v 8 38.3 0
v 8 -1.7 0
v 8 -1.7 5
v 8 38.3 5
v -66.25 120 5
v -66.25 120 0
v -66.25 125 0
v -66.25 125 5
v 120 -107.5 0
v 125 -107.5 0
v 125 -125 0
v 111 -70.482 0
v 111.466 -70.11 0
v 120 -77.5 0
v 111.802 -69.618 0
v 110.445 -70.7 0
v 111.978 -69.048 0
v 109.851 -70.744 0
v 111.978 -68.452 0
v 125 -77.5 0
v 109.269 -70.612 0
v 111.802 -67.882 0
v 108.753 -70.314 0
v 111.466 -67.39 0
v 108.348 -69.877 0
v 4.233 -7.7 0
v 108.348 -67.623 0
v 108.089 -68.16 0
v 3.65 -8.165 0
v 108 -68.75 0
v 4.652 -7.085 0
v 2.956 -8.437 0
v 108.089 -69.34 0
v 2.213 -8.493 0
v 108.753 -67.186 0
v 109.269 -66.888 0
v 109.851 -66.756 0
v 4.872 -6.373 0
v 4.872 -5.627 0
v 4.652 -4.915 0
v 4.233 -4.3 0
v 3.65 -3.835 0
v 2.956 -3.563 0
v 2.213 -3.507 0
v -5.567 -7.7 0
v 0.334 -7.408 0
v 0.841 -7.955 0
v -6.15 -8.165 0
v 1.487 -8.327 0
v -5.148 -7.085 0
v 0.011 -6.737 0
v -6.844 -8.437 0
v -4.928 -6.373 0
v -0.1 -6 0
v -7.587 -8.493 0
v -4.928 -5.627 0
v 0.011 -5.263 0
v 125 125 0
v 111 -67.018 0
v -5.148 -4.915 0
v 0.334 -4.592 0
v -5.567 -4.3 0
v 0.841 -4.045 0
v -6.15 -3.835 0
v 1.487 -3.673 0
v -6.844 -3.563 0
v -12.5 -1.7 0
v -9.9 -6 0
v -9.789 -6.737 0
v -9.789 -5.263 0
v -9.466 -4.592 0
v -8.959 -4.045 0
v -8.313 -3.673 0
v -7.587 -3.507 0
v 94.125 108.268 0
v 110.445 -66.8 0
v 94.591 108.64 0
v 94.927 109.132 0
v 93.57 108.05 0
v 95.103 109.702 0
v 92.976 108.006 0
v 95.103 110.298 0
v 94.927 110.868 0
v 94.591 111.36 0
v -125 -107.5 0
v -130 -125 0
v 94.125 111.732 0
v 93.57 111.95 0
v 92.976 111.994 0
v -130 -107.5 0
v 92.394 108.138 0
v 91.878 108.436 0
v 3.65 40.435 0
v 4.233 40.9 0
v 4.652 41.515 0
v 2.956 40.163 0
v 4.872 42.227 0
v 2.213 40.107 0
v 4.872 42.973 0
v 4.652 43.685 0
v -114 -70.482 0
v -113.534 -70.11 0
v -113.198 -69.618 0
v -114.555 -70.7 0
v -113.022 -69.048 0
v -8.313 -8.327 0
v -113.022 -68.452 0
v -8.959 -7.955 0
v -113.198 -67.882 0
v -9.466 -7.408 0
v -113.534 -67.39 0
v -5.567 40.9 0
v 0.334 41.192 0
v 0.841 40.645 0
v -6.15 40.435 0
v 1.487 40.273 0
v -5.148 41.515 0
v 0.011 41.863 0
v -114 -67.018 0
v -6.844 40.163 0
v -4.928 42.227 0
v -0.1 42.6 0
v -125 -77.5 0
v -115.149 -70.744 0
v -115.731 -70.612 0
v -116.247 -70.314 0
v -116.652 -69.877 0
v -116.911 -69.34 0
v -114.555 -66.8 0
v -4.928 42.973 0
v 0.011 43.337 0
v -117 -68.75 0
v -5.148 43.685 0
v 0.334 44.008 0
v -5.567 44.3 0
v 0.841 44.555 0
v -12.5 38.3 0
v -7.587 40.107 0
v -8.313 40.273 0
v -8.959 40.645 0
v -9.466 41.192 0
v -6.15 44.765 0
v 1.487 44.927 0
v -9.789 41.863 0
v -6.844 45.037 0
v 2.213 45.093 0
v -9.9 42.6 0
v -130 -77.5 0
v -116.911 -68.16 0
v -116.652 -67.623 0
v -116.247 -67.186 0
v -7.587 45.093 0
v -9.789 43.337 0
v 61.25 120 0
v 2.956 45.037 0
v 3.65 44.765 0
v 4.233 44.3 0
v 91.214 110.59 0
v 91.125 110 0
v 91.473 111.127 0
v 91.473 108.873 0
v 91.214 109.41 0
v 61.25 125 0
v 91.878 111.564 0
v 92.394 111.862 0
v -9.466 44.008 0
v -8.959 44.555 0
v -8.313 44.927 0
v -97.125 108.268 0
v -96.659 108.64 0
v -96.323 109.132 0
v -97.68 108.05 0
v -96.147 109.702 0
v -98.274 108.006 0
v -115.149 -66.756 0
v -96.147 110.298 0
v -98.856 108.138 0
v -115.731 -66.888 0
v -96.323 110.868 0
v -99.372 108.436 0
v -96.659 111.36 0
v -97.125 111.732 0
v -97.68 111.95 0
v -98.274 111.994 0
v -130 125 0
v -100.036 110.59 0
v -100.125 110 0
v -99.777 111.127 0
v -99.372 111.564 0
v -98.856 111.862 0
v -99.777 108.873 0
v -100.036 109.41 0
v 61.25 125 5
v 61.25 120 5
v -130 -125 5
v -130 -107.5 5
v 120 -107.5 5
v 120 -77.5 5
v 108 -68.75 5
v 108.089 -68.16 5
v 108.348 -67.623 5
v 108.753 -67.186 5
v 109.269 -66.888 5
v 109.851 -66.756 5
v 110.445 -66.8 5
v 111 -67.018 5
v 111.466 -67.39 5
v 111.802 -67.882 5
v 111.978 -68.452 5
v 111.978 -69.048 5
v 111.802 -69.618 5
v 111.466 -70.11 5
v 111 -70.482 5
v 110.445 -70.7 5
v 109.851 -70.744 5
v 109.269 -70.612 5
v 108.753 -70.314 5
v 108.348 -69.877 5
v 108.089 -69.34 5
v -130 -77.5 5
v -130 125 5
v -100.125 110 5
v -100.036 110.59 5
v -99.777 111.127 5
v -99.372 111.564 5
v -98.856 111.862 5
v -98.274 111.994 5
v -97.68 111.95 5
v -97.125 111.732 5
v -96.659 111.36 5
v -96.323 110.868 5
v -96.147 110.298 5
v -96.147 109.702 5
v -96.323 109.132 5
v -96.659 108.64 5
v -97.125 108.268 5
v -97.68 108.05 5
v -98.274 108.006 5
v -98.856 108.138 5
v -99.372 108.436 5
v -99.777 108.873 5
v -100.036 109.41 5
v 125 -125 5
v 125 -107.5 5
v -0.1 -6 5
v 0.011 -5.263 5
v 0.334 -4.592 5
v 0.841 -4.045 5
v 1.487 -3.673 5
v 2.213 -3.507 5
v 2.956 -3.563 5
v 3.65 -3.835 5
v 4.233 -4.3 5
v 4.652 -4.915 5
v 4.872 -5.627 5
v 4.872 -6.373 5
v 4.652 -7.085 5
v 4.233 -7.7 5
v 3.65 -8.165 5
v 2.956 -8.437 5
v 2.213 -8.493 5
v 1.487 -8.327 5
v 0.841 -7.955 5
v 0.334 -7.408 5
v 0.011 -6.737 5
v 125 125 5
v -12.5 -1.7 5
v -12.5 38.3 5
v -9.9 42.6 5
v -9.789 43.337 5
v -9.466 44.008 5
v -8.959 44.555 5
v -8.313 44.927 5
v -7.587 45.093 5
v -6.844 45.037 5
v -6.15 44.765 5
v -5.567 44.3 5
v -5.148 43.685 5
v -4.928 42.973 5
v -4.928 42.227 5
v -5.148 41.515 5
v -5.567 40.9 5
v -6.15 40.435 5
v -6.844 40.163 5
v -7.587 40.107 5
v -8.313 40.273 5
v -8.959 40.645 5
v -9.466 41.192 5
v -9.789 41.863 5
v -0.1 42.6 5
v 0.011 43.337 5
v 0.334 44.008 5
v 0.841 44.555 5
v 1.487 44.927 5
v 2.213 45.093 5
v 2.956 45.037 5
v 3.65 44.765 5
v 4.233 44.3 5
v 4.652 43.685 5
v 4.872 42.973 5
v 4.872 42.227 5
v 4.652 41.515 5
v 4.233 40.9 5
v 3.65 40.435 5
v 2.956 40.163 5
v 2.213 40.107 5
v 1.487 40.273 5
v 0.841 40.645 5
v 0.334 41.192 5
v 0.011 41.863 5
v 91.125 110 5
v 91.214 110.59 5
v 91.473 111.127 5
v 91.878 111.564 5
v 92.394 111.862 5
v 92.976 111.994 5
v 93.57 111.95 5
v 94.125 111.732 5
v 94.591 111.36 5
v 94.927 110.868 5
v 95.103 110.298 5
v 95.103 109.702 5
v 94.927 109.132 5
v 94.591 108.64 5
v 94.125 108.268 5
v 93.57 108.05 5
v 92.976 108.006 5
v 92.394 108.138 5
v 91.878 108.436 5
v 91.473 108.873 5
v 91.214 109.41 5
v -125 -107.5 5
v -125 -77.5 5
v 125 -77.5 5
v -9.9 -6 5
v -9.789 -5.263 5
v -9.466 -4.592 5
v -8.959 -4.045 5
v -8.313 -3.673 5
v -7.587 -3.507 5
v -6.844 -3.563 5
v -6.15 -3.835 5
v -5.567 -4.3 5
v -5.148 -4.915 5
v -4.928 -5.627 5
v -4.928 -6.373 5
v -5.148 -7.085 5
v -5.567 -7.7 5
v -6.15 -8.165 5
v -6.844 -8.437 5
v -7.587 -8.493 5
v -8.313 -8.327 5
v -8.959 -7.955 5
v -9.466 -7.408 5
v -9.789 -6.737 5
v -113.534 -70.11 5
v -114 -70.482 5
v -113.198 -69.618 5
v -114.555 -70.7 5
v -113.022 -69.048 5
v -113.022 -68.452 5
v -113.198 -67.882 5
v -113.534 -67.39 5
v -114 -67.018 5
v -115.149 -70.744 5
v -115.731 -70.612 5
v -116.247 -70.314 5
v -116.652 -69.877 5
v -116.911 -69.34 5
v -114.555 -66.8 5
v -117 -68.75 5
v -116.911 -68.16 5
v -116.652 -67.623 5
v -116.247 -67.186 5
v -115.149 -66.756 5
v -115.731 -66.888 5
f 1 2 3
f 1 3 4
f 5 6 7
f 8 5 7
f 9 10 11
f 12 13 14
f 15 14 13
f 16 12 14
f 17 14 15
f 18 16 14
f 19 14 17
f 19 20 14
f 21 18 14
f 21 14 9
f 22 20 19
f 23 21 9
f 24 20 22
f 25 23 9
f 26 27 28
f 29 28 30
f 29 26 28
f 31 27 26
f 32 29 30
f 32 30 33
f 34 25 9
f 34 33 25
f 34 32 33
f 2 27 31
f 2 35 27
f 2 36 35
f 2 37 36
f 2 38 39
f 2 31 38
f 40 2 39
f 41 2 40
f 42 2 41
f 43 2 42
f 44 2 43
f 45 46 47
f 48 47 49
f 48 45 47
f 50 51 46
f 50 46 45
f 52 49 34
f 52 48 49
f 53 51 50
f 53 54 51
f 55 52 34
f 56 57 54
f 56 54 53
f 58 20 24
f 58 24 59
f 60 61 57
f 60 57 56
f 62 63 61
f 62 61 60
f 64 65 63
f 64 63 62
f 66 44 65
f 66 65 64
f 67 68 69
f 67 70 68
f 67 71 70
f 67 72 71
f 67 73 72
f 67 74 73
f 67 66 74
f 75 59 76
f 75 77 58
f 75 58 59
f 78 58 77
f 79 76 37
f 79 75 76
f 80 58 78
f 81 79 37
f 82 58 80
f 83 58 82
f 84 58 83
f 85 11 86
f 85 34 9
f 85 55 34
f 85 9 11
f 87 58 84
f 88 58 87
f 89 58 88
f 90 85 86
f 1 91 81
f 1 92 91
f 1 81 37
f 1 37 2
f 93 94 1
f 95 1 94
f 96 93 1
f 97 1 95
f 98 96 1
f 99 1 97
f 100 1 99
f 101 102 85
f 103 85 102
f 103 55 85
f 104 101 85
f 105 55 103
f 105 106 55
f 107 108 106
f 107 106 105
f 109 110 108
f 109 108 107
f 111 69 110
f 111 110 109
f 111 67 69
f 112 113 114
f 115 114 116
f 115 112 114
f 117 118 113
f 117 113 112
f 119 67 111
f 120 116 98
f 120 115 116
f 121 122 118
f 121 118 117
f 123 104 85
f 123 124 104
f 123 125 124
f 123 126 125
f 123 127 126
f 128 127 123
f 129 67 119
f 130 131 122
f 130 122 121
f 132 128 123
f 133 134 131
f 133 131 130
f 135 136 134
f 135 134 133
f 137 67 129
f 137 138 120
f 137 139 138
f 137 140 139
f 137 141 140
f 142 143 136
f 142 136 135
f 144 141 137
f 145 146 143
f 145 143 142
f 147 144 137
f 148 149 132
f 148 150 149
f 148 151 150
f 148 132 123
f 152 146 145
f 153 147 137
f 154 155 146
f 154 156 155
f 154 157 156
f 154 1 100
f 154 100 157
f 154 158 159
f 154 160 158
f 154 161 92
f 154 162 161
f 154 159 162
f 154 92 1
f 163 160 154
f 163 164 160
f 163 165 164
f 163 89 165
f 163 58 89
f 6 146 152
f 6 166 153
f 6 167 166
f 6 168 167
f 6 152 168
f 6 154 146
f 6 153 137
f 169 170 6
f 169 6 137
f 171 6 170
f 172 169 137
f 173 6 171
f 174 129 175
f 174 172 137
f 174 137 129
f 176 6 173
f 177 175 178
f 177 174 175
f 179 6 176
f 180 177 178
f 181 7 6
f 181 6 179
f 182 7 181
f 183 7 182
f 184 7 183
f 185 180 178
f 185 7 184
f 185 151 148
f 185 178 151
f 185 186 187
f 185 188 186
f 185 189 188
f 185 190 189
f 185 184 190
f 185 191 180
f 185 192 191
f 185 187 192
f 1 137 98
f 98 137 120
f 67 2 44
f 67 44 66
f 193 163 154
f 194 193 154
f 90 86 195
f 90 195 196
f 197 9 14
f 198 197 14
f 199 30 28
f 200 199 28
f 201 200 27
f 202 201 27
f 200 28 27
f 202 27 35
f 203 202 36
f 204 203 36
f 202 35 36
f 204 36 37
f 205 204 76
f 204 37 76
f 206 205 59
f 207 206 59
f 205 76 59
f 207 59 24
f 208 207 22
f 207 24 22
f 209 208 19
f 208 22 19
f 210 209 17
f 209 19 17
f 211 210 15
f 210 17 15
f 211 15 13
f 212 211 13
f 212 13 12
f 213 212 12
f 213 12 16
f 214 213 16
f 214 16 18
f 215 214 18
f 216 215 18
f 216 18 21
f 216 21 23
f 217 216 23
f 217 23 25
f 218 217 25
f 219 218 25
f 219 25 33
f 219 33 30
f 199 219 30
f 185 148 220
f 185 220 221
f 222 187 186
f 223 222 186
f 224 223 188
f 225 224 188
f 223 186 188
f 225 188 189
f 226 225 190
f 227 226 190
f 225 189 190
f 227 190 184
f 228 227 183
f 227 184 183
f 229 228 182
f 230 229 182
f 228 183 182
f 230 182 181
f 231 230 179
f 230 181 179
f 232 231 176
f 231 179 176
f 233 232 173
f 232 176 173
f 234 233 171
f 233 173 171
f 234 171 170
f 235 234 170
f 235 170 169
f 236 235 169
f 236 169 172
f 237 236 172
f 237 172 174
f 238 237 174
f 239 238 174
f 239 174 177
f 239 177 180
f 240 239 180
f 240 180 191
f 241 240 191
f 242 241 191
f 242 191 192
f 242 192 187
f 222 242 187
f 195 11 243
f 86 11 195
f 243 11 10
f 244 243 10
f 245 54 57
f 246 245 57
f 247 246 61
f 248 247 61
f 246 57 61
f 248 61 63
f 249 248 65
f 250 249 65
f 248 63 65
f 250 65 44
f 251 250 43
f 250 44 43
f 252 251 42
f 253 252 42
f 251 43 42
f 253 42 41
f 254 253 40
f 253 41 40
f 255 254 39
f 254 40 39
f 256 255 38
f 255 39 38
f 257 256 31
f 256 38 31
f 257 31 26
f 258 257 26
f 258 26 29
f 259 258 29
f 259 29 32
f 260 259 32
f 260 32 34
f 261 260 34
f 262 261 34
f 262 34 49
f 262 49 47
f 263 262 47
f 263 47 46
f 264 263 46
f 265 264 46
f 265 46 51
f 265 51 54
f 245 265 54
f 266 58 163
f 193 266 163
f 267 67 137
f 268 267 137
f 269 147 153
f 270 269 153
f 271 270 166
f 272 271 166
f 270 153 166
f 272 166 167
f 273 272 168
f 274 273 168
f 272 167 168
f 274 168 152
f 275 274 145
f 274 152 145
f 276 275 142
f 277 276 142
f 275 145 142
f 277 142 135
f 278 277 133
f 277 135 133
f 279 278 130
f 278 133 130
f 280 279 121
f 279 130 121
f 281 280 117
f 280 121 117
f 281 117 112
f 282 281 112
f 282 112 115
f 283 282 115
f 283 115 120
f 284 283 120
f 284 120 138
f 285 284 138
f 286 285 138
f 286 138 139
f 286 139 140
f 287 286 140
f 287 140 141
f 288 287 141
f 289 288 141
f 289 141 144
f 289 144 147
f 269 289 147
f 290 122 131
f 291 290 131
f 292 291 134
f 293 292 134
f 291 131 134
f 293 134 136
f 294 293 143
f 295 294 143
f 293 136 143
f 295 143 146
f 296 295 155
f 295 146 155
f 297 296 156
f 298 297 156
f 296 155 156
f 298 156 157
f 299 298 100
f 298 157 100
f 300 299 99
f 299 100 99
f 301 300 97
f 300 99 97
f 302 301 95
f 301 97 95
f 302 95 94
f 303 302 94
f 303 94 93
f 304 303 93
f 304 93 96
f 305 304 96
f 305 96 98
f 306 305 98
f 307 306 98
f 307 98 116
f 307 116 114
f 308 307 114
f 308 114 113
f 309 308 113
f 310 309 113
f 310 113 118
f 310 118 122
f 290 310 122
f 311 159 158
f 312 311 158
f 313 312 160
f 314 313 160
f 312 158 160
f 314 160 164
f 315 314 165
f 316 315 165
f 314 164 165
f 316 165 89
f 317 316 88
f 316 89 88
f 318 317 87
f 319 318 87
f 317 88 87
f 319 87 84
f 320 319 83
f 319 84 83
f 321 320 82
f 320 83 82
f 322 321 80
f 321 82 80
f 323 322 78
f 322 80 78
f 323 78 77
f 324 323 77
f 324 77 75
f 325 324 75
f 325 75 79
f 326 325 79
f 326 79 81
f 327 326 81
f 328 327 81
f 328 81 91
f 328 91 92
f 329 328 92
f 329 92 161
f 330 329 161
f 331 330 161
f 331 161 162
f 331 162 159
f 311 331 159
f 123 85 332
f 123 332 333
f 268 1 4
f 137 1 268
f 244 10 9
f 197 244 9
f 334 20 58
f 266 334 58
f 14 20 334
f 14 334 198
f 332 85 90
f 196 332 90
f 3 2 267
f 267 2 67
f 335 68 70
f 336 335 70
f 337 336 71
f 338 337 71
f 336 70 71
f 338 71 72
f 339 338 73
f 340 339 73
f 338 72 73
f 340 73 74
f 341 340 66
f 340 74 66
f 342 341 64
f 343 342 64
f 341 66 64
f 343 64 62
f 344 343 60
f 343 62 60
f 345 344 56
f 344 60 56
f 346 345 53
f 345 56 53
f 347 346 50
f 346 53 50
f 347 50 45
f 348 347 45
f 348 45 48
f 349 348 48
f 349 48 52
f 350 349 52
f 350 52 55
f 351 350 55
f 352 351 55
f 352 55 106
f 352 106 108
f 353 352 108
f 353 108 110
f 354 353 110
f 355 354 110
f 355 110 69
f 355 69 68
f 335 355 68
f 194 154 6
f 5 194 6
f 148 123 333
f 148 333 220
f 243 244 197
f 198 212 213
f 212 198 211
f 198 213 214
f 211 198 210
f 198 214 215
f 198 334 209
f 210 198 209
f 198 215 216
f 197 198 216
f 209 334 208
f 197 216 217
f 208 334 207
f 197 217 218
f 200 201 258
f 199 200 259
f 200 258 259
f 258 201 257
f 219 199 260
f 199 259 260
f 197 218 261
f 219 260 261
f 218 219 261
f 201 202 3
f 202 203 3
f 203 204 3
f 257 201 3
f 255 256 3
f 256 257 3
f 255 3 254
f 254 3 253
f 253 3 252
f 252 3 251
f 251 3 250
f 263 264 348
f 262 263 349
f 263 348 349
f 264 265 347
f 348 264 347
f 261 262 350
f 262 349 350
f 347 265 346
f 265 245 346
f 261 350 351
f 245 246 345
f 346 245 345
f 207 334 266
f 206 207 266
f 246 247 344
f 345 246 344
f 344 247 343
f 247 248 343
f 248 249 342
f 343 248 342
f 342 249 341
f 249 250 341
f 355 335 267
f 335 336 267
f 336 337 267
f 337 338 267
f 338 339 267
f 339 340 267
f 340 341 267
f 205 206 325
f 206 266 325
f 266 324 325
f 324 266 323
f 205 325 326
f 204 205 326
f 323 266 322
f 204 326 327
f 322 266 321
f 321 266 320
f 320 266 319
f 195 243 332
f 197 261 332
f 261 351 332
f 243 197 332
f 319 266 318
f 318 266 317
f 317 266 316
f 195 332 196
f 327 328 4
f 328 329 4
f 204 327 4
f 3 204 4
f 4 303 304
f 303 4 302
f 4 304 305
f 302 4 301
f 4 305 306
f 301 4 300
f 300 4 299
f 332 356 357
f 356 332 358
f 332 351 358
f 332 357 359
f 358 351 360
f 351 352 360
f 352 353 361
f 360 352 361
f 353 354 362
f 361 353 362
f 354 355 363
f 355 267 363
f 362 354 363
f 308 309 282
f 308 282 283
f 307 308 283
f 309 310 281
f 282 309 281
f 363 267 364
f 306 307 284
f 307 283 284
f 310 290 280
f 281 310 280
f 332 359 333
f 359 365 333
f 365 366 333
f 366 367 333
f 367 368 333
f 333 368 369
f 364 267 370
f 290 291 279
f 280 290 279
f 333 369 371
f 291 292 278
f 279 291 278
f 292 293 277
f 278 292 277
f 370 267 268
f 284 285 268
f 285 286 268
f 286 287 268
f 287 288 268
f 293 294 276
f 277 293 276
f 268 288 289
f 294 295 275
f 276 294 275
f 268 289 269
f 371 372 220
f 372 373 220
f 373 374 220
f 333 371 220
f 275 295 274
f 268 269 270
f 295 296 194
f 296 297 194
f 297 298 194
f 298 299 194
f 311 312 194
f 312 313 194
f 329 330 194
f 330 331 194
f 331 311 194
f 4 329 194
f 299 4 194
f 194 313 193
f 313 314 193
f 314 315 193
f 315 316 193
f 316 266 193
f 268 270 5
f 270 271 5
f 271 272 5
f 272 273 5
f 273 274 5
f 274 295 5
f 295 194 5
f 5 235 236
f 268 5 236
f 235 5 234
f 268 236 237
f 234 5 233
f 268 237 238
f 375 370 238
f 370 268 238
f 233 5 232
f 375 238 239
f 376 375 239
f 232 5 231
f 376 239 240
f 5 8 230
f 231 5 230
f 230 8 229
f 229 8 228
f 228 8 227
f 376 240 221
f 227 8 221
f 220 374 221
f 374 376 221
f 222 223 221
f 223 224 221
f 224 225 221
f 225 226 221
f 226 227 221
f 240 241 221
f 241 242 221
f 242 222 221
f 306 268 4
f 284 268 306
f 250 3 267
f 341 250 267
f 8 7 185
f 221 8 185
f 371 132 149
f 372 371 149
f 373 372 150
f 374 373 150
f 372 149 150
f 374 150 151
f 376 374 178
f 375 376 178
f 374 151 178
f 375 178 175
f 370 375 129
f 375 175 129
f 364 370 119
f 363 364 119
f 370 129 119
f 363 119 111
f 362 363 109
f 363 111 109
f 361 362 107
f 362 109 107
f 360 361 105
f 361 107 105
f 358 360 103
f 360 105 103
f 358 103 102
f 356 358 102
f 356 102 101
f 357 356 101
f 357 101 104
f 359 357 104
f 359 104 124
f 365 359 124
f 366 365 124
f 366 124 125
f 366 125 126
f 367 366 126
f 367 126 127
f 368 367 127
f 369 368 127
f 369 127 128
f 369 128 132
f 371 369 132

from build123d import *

# Parameters (mm, degrees)
SKETCH2_W               = 255
SKETCH2_H               = 250
BOSS_EXTRUDE1_DEPTH     = 5
SKETCH4_W               = 20
SKETCH4_H               = 54.5
CUT_EXTRUDE1_DEPTH      = 32
CUT_EXTRUDE1_DEPTH_BACK = 23
SKETCH5_W               = 20
SKETCH5_H               = 7.25
BOSS_EXTRUDE3_DEPTH     = 5
CUT_EXTRUDE2_DEPTH      = 23
SKETCH7_R               = 2.5
CUT_EXTRUDE3_DEPTH      = 23
BOSS_EXTRUDE6_DEPTH     = 5
SKETCH9_W               = 0.5
SKETCH9_H               = 0.5
BOSS_EXTRUDE7_DEPTH     = 5
SKETCH10_W              = 6
SKETCH10_H              = 65
BOSS_EXTRUDE8_DEPTH     = 5
SKETCH10_3_W            = 5
SKETCH10_3_H            = 30
CUT_EXTRUDE4_DEPTH      = 10
SKETCH11_W              = 6
SKETCH11_H              = 185
BOSS_EXTRUDE9_DEPTH     = 5
SKETCH14_W              = 6
SKETCH14_H              = 250
CUT_EXTRUDE5_DEPTH      = 10
CUT_EXTRUDE6_DEPTH      = 185
SKETCH16_R              = 1.5
CUT_EXTRUDE7_DEPTH      = 185
SKETCH17_R              = 1.5
CUT_EXTRUDE8_DEPTH      = 185
SKETCH18_R              = 2
CUT_EXTRUDE9_DEPTH      = 10


with BuildPart() as part:
    # Sketch2 → Boss-Extrude1 (new body)
    with BuildSketch(Plane.XY):
        with Locations((-2.5, 0)):
            Rectangle(SKETCH2_W, SKETCH2_H)
    extrude(amount=BOSS_EXTRUDE1_DEPTH)

    # Sketch4 → Cut-Extrude1 (cut, two sides)
    with BuildSketch(Plane(origin=(0, 0, 0), x_dir=(-1, 0, 0), z_dir=(0, 0, -1))) as cut_extrude1_sk:
        with Locations((2.5, 18.3)):
            Rectangle(SKETCH4_W, SKETCH4_H)
    extrude(amount=CUT_EXTRUDE1_DEPTH, mode=Mode.SUBTRACT)
    extrude(cut_extrude1_sk.sketch, amount=-CUT_EXTRUDE1_DEPTH_BACK, mode=Mode.SUBTRACT)

    # Sketch5 → Boss-Extrude3 (add)
    with BuildSketch(Plane(origin=(0, 0, 0), x_dir=(-1, 0, 0), z_dir=(0, 0, -1))):
        with Locations((2.5, 41.925)):
            Rectangle(SKETCH5_W, SKETCH5_H)
        with Locations((2.5, -5.325)):
            Rectangle(SKETCH5_W, SKETCH5_H)
    extrude(amount=-BOSS_EXTRUDE3_DEPTH)

    # Sketch6 → Cut-Extrude2 (cut)
    with BuildSketch(Plane(origin=(0, 0, 0), x_dir=(-1, 0, 0), z_dir=(0, 0, -1))):
        Polygon((-7.5, 38.3), (-7.5, 48.3), (-32.5, 48.3), (-32.5, -11.7), (-7.5, -11.7), (-7.5, -1.7), align=None)
    extrude(amount=-CUT_EXTRUDE2_DEPTH, mode=Mode.SUBTRACT)

    # Sketch7 → Cut-Extrude3 (cut)
    with BuildSketch(Plane(origin=(0, 0, 0), x_dir=(-1, 0, 0), z_dir=(0, 0, -1))):
        with Locations((-2.4, 42.6)):
            Circle(SKETCH7_R)
        with Locations((7.4, 42.6)):
            Circle(SKETCH7_R)
        with Locations((-2.4, -6)):
            Circle(SKETCH7_R)
        with Locations((7.4, -6)):
            Circle(SKETCH7_R)
    extrude(amount=-CUT_EXTRUDE3_DEPTH, mode=Mode.SUBTRACT)

    # Sketch8 → Boss-Extrude6 (add)
    with BuildSketch(Plane(origin=(0, 0, 0), x_dir=(-1, 0, 0), z_dir=(0, 0, -1))):
        Polygon((-8, 38.8), (-7.5, 38.8), (-7.5, 48.3), (-32.5, 48.3), (-32.5, -11.7), (-7.5, -11.7), (-7.5, -2.2), (-8, -2.2), align=None)
    extrude(amount=-BOSS_EXTRUDE6_DEPTH)

    # Sketch9 → Boss-Extrude7 (add)
    with BuildSketch(Plane(origin=(0, 0, 0), x_dir=(-1, 0, 0), z_dir=(0, 0, -1))):
        with Locations((-7.75, 38.55)):
            Rectangle(SKETCH9_W, SKETCH9_H)
        with Locations((-7.75, -1.95)):
            Rectangle(SKETCH9_W, SKETCH9_H)
    extrude(amount=-BOSS_EXTRUDE7_DEPTH)

    # Sketch10 → Boss-Extrude8 (add)
    with BuildSketch(Plane(origin=(0, 0, 0), x_dir=(-1, 0, 0), z_dir=(0, 0, -1))):
        Polygon((130, -107.5), (130, -125), (136, -125), (136, -60), (130, -60), (130, -77.5), align=None)
        with Locations((-128, -92.5)):
            Rectangle(SKETCH10_W, SKETCH10_H)
    extrude(amount=-BOSS_EXTRUDE8_DEPTH)

    # Sketch10<3> → Cut-Extrude4 (cut)
    with BuildSketch(Plane(origin=(0, 0, 0), x_dir=(-1, 0, 0), z_dir=(0, 0, -1))):
        with Locations((127.5, -92.5)):
            Rectangle(SKETCH10_3_W, SKETCH10_3_H)
        with Locations((-122.5, -92.5)):
            Rectangle(SKETCH10_3_W, SKETCH10_3_H)
    extrude(amount=-CUT_EXTRUDE4_DEPTH, mode=Mode.SUBTRACT)

    # Sketch11 → Boss-Extrude9 (add)
    with BuildSketch(Plane(origin=(0, 0, 0), x_dir=(-1, 0, 0), z_dir=(0, 0, -1))):
        with Locations((-128, 32.5)):
            Rectangle(SKETCH11_W, SKETCH11_H)
        with Locations((133, 32.5)):
            Rectangle(SKETCH11_W, SKETCH11_H)
    extrude(amount=-BOSS_EXTRUDE9_DEPTH)

    # Sketch14 → Cut-Extrude5 (cut)
    with BuildSketch(Plane(origin=(0, 0, 0), x_dir=(-1, 0, 0), z_dir=(0, 0, -1))):
        with Locations((-128, 0)):
            Rectangle(SKETCH14_W, SKETCH14_H)
        with Locations((133, 0)):
            Rectangle(SKETCH14_W, SKETCH14_H)
    extrude(amount=-CUT_EXTRUDE5_DEPTH, mode=Mode.SUBTRACT)

    # Sketch15 → Cut-Extrude6 (cut)
    with BuildSketch(Plane(origin=(0, 0, 0), x_dir=(-1, 0, 0), z_dir=(0, 0, -1))):
        Polygon((2.5, 125), (-61.25, 125), (-61.25, 120), (2.5, 120), (66.25, 120), (66.25, 125), align=None)
    extrude(amount=-CUT_EXTRUDE6_DEPTH, mode=Mode.SUBTRACT)

    # Sketch16 → Cut-Extrude7 (cut)
    with BuildSketch(Plane(origin=(0, 0, 0), x_dir=(-1, 0, 0), z_dir=(0, 0, -1))):
        with Locations((-93.125, 110)):
            Circle(SKETCH16_R)
        with Locations((98.125, 110)):
            Circle(SKETCH16_R)
    extrude(amount=-CUT_EXTRUDE7_DEPTH, mode=Mode.SUBTRACT)

    # Sketch17 → Cut-Extrude8 (cut)
    with BuildSketch(Plane(origin=(0, 0, 0), x_dir=(-1, 0, 0), z_dir=(0, 0, -1))):
        with Locations((-110, -68.75)):
            Circle(SKETCH17_R)
        with Locations((115, -68.75)):
            Circle(SKETCH17_R)
    extrude(amount=-CUT_EXTRUDE8_DEPTH, mode=Mode.SUBTRACT)

    # Sketch18 → Cut-Extrude9 (cut)
    with BuildSketch(Plane(origin=(0, 0, 0), x_dir=(-1, 0, 0), z_dir=(0, 0, -1))):
        with Locations((-93.125, 110)):
            Circle(SKETCH18_R)
        with Locations((98.125, 110)):
            Circle(SKETCH18_R)
        with Locations((115, -68.75)):
            Circle(SKETCH18_R)
        with Locations((-110, -68.75)):
            Circle(SKETCH18_R)
    extrude(amount=-CUT_EXTRUDE9_DEPTH, mode=Mode.SUBTRACT)


solid = part.part
